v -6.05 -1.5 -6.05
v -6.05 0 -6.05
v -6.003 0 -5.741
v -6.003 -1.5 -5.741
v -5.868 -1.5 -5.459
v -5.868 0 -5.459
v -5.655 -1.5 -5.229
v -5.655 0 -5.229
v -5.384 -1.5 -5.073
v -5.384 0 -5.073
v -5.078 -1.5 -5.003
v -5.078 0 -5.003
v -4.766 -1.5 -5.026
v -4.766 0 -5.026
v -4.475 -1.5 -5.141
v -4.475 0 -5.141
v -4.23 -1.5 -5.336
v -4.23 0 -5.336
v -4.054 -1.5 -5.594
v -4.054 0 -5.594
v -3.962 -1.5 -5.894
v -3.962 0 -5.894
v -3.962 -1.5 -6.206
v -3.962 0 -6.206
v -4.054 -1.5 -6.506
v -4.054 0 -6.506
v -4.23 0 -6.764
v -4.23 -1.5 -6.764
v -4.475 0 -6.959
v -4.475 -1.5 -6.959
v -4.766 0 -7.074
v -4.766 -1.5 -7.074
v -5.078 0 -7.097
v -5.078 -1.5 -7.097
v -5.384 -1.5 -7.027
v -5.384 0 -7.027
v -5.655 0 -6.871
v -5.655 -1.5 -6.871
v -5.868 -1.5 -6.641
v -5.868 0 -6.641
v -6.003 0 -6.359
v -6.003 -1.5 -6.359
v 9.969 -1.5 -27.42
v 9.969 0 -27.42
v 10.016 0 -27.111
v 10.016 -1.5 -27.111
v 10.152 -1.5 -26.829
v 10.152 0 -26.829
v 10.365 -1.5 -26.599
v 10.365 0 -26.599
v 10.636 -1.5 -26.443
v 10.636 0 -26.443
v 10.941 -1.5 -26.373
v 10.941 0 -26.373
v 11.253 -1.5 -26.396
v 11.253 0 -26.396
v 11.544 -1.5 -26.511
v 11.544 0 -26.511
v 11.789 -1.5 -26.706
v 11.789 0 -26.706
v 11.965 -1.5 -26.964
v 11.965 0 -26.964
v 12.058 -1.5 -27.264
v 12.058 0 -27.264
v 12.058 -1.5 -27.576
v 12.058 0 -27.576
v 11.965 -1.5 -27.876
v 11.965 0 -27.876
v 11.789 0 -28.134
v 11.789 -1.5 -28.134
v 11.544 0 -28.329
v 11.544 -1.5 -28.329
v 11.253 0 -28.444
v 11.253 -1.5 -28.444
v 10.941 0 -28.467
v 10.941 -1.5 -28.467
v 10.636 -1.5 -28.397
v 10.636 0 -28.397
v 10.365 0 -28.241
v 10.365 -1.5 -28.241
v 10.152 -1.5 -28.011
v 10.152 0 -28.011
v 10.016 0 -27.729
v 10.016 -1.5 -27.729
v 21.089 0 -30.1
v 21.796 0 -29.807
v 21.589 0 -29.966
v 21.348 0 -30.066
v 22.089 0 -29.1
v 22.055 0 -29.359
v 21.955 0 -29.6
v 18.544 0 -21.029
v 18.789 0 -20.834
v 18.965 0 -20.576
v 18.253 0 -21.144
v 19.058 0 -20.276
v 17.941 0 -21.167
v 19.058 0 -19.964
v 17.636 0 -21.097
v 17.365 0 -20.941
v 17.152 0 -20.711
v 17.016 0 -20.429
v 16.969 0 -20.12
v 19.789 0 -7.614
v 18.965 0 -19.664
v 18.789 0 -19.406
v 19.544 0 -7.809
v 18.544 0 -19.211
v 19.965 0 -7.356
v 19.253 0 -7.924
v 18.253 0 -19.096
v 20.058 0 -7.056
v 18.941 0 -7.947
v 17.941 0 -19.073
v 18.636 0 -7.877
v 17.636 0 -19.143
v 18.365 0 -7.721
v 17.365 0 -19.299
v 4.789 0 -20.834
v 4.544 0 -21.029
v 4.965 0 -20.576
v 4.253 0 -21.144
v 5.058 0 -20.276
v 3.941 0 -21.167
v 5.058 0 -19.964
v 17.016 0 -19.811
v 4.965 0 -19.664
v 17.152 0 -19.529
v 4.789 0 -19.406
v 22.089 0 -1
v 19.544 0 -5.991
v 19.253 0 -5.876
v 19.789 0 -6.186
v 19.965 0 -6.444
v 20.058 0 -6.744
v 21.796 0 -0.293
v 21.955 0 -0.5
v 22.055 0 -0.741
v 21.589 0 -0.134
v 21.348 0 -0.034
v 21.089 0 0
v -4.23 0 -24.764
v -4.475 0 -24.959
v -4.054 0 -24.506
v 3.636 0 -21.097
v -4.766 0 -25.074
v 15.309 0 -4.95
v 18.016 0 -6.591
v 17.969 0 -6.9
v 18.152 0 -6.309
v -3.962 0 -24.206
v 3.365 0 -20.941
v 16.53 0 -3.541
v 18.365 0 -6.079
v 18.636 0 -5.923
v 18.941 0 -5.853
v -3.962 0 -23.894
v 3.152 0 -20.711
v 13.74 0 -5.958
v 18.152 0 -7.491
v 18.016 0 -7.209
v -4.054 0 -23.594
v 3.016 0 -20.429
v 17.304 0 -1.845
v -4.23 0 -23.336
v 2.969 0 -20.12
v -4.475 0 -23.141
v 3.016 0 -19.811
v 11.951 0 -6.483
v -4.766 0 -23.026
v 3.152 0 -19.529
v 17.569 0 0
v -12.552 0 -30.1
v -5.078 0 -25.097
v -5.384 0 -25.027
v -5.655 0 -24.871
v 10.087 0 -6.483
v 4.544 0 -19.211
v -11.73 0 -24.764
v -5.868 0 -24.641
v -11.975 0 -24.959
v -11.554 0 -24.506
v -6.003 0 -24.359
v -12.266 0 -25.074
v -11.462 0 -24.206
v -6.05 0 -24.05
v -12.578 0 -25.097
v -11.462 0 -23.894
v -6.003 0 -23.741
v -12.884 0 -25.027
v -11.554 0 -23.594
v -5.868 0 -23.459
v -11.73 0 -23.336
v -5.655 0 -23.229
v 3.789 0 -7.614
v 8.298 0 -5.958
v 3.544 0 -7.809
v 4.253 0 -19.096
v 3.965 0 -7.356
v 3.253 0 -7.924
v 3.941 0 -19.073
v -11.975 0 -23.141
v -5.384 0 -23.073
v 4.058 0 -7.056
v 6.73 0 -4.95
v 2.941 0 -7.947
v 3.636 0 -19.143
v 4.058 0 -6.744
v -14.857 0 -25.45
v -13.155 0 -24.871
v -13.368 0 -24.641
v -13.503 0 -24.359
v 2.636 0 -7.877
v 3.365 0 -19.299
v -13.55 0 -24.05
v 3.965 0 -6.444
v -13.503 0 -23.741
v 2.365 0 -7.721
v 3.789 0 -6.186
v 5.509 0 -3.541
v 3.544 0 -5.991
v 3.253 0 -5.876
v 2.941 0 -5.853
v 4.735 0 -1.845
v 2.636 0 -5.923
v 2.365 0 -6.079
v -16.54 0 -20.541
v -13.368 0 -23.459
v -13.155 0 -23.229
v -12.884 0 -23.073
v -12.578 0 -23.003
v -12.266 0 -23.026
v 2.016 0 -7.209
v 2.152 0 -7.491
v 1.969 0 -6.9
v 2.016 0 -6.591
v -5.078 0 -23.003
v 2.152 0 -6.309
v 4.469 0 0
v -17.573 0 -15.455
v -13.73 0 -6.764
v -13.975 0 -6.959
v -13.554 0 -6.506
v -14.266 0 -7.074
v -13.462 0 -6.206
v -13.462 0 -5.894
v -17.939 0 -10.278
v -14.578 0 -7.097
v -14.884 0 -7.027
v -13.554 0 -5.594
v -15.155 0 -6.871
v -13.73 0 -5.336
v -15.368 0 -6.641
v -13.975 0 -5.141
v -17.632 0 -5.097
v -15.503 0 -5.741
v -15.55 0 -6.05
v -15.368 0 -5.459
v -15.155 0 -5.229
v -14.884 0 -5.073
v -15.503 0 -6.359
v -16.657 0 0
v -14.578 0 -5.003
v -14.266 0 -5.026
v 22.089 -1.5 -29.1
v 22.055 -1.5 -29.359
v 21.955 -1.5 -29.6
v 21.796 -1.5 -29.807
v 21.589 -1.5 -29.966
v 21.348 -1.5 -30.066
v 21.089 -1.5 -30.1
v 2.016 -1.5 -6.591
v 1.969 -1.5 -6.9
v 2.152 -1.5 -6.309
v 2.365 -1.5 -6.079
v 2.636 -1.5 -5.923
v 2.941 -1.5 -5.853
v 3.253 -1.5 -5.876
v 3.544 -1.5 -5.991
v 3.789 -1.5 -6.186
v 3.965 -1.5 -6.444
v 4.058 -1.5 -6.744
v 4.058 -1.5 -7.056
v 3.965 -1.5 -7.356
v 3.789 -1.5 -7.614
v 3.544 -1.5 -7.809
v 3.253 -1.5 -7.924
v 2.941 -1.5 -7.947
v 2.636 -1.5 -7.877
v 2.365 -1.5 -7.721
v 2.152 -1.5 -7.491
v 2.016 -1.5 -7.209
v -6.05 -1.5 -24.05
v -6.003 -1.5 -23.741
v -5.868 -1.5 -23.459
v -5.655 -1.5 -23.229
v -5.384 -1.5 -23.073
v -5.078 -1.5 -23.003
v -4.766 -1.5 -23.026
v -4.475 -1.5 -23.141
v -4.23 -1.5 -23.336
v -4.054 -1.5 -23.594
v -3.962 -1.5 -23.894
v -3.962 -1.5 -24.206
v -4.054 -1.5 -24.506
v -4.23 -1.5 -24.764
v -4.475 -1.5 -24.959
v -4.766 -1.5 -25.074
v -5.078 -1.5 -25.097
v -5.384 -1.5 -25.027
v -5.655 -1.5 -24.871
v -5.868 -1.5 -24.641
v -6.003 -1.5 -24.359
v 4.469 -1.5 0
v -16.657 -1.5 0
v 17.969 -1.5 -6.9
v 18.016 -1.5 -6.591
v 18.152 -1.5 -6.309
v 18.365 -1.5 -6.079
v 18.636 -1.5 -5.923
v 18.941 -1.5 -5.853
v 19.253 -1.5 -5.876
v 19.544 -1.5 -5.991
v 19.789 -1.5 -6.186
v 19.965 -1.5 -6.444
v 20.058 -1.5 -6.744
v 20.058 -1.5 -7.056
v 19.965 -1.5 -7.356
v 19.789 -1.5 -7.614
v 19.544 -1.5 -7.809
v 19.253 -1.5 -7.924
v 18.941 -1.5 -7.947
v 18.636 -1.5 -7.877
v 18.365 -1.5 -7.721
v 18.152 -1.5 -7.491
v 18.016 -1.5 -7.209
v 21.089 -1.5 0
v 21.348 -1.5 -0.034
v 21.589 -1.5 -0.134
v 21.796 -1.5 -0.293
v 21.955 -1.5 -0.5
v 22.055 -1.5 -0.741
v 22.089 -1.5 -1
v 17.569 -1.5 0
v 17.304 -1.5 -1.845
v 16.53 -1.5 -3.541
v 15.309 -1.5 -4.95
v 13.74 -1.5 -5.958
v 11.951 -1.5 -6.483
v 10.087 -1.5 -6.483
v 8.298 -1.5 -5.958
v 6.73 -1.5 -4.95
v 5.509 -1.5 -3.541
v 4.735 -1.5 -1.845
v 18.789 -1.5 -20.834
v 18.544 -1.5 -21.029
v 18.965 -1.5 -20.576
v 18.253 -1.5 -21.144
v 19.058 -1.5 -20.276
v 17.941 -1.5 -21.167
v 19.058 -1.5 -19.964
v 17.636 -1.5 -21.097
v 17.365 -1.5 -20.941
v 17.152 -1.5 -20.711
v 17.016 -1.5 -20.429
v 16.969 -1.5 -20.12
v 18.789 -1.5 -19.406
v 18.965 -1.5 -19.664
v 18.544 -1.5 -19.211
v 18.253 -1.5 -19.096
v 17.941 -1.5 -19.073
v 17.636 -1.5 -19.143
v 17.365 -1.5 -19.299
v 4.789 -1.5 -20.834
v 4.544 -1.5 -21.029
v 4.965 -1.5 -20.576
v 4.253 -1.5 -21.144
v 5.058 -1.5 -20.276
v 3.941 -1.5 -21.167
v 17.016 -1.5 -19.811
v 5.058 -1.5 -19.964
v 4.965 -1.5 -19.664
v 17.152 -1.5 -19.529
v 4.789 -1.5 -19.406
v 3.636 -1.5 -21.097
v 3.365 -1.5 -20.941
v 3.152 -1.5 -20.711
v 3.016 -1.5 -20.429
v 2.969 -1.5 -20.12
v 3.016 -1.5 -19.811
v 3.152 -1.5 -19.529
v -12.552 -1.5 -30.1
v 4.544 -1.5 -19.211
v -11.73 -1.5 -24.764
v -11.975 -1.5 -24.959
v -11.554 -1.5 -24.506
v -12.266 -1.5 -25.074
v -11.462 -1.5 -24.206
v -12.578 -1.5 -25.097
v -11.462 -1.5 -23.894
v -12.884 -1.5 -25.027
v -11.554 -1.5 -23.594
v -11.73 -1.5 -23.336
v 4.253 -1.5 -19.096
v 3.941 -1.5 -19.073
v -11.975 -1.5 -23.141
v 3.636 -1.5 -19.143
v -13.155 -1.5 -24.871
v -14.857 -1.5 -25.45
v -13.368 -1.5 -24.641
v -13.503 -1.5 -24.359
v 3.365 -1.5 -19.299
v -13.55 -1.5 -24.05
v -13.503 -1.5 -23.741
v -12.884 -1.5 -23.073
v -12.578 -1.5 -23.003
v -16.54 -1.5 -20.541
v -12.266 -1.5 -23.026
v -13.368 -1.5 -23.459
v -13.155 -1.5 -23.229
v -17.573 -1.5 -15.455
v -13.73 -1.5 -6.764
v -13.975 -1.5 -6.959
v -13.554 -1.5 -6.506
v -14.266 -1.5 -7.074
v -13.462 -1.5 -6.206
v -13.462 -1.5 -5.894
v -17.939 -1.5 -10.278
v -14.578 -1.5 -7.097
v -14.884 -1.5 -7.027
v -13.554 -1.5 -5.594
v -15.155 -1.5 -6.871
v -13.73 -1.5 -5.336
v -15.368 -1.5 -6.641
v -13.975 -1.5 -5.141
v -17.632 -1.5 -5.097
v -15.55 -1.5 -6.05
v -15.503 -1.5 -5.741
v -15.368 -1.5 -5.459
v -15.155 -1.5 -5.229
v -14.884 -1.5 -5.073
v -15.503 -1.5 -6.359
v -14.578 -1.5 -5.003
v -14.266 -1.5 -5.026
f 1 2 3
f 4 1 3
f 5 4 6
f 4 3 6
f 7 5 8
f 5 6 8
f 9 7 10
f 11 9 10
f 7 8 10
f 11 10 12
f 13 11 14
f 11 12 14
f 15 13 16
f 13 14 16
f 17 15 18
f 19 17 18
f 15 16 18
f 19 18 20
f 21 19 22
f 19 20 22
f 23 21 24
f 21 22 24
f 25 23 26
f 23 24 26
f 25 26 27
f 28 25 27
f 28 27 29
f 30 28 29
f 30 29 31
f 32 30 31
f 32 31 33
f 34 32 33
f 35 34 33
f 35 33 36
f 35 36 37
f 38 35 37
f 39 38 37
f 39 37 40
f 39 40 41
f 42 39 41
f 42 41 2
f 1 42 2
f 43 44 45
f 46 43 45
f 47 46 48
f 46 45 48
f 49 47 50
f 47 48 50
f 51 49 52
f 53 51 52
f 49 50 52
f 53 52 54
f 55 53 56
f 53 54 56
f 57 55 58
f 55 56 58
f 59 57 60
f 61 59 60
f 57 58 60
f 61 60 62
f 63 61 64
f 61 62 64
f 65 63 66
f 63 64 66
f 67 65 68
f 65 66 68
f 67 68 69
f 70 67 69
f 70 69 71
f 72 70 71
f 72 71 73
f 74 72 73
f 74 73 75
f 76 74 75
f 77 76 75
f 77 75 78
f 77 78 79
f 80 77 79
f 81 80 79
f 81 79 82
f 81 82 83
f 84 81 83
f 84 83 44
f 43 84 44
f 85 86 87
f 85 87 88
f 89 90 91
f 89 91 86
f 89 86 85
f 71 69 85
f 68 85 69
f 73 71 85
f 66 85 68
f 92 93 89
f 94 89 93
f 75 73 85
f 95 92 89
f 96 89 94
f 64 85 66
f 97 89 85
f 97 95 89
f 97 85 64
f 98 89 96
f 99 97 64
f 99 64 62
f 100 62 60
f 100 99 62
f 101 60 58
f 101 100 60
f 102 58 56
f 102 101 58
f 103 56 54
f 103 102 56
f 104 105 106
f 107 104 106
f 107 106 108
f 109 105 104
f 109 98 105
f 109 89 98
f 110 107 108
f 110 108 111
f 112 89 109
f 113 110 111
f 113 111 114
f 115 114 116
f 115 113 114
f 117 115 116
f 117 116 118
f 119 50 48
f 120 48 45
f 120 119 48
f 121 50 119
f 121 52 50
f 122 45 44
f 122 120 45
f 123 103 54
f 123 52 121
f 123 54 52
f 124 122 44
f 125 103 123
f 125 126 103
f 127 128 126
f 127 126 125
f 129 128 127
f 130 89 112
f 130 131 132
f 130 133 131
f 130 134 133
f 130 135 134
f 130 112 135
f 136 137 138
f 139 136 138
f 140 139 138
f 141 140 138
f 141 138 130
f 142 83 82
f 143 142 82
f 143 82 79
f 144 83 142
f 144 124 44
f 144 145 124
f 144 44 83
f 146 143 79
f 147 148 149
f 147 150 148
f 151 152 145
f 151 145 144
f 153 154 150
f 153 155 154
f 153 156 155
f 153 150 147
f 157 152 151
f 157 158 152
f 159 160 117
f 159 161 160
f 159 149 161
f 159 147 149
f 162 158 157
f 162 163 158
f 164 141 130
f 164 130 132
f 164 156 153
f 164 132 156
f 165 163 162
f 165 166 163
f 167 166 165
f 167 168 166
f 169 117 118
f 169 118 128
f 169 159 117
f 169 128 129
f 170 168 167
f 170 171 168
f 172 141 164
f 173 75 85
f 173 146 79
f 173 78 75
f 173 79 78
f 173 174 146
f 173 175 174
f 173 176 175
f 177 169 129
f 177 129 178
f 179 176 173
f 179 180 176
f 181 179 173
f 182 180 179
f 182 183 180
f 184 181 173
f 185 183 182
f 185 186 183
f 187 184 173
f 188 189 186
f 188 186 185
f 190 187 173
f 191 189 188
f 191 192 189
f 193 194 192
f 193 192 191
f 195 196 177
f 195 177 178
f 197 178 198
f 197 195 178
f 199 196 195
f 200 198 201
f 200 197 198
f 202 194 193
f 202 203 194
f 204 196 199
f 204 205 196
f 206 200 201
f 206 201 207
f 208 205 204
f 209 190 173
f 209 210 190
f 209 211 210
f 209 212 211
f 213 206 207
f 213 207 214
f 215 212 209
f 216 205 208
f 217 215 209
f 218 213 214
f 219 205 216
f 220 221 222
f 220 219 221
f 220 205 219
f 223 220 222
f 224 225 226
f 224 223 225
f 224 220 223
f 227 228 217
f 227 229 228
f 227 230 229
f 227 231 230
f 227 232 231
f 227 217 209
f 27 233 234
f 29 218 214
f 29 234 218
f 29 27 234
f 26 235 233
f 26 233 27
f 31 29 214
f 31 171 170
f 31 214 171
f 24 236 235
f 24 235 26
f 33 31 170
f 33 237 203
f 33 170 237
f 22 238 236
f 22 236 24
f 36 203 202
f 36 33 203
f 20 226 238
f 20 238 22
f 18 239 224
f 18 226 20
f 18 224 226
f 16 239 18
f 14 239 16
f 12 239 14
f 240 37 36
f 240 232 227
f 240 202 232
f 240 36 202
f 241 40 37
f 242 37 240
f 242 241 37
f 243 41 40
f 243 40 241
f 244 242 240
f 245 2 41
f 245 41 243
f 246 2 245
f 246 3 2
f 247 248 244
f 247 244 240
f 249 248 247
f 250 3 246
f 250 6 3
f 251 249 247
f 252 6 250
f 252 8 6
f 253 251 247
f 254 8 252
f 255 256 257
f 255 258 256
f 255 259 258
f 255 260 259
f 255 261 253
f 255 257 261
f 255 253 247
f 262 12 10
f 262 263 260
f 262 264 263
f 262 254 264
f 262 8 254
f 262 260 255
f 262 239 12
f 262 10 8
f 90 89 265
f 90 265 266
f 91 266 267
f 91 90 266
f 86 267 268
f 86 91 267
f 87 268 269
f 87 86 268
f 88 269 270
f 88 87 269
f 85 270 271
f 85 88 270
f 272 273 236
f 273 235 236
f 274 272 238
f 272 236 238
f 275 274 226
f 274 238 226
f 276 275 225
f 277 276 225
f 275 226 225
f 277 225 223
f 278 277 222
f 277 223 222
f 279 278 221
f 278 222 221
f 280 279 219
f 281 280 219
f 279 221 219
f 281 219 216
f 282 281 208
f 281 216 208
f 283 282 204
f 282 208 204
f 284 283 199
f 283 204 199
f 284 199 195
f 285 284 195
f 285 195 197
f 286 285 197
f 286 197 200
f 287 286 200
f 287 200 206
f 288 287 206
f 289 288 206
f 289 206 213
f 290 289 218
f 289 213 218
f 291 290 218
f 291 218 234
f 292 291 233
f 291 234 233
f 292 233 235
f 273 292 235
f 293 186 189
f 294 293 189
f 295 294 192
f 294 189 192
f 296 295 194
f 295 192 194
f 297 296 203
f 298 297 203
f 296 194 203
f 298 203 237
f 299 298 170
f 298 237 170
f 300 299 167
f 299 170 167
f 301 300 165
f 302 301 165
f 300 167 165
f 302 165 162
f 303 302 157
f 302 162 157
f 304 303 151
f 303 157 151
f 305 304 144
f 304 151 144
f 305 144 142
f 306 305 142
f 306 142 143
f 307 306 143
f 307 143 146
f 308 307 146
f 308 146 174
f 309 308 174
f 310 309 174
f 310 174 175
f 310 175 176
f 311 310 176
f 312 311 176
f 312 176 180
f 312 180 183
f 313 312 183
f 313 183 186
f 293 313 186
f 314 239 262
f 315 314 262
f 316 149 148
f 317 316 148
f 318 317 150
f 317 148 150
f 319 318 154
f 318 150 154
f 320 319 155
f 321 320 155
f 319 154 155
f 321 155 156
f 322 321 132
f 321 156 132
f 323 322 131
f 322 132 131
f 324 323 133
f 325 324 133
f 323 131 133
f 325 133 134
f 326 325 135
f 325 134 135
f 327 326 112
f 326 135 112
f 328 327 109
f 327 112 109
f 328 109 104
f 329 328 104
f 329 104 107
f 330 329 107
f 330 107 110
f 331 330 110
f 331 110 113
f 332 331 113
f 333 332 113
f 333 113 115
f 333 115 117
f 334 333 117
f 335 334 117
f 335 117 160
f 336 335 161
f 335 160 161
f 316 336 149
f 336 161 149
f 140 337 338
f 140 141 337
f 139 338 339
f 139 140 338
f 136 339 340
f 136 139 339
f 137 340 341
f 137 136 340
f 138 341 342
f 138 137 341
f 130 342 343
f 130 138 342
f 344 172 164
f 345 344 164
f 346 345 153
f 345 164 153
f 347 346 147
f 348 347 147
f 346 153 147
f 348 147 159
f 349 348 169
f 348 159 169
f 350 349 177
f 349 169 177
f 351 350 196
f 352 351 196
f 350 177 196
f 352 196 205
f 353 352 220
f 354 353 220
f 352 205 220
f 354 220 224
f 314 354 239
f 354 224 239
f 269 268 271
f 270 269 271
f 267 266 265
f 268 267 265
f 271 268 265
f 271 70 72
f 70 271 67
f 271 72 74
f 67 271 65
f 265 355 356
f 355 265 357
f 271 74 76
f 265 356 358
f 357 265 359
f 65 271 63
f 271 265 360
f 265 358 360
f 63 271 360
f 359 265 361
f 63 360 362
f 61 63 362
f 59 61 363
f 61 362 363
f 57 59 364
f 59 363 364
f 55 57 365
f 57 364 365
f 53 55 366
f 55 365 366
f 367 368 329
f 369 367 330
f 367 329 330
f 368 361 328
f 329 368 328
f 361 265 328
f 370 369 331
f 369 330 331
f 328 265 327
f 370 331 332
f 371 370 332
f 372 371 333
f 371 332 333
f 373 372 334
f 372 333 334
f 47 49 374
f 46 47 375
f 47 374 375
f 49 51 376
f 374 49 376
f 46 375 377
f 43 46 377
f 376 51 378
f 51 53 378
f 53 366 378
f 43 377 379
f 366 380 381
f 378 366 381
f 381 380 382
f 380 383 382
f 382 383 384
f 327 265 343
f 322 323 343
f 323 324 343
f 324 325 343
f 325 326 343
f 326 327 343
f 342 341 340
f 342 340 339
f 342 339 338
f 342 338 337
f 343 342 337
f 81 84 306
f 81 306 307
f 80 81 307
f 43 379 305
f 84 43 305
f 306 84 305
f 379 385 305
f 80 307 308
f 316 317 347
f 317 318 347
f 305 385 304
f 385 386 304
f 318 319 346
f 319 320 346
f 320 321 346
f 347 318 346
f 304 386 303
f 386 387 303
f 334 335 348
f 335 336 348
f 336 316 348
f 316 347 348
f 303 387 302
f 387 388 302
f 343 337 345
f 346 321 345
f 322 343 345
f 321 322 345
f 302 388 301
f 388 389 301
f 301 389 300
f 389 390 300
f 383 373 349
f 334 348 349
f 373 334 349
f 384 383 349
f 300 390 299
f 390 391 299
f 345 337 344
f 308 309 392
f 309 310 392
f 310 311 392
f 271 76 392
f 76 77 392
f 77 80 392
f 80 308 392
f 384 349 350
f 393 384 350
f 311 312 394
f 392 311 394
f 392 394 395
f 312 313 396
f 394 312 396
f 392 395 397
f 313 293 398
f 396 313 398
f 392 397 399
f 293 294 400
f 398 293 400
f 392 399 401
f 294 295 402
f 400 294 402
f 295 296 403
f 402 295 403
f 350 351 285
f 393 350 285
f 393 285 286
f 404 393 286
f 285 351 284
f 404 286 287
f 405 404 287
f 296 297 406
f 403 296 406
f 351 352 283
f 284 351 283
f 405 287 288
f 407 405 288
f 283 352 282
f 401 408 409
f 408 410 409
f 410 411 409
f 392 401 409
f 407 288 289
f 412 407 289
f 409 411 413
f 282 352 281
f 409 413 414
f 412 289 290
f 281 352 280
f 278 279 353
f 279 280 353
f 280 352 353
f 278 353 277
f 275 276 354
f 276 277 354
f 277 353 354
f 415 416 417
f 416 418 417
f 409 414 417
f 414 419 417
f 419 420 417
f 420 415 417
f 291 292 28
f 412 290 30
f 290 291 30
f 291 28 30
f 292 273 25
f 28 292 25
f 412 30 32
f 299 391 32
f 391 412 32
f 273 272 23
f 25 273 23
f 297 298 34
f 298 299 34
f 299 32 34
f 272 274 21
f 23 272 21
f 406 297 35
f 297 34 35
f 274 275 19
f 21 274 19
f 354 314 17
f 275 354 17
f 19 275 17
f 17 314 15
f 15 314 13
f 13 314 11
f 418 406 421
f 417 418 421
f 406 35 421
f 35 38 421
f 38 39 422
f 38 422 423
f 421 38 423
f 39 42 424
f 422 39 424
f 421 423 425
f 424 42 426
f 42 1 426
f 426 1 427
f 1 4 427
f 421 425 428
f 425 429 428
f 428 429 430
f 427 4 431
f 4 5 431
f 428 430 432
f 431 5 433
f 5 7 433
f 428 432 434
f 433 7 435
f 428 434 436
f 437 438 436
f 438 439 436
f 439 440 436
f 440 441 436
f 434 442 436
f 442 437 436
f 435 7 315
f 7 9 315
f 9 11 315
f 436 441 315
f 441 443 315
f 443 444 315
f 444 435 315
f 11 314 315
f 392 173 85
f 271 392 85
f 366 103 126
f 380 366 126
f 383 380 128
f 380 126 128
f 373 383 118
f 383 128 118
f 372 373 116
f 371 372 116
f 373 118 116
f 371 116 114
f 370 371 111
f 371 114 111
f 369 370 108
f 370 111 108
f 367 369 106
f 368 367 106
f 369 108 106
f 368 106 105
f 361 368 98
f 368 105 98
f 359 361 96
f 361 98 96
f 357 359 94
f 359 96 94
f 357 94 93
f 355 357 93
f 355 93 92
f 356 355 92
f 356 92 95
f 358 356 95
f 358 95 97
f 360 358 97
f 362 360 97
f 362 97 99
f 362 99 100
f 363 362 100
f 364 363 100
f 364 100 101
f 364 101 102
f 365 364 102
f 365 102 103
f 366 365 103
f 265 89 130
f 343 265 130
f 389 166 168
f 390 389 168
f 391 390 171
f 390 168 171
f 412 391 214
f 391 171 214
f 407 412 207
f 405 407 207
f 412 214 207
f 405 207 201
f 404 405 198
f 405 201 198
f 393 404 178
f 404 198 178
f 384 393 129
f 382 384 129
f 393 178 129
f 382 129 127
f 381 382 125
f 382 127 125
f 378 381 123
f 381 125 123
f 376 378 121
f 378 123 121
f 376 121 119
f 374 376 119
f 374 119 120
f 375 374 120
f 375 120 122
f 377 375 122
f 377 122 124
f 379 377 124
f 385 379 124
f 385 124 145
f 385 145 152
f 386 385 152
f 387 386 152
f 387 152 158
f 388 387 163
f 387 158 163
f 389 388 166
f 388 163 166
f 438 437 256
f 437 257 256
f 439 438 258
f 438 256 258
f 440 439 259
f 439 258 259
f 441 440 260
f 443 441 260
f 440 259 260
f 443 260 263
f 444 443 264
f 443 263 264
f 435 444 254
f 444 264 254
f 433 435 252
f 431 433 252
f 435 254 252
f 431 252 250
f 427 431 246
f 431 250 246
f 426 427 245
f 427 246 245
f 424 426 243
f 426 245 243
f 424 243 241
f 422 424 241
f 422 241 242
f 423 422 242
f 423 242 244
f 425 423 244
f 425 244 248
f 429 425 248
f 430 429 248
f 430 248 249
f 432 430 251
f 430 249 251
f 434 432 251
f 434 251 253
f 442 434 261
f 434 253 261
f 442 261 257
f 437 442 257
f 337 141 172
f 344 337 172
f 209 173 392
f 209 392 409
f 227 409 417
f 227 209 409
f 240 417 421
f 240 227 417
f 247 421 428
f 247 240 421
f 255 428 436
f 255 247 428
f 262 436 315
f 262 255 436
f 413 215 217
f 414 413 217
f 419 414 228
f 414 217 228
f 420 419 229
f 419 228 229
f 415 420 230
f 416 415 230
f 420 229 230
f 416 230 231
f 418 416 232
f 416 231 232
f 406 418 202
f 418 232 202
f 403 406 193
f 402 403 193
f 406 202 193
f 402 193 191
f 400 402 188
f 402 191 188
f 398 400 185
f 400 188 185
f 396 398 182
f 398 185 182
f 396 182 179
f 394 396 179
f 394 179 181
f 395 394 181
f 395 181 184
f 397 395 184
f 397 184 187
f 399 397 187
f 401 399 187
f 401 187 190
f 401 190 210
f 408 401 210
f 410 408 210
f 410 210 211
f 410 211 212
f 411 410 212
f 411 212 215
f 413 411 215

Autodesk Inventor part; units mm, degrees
ref_plane "YZ Plane" through (0, 0, 0) normal (1, 0, 0) x (0, 1, 0)
ref_plane "XZ Plane" through (0, 0, 0) normal (0, 1, 0) x (-1, 0, 0)
ref_plane "XY Plane" through (0, 0, 0) normal (0, 0, 1) x (1, 0, 0)
sketch "Sketch1" plane through (0, 0, 0) normal (0, 1, 0) x (-1, 0, 0)
  line L0 (-0.4496, -30.1) -> (-0.4496, 0)
  circle A0 centre (14.5, -6.05) radius 1.05
  circle A1 centre (12.5, -24.05) radius 1.05
  circle A2 centre (5, -24.05) radius 1.05
  circle A3 centre (5, -6.05) radius 1.05
  circle A4 centre (-19.0193, -6.9) radius 1.05
  circle A5 centre (-18.0193, -20.12) radius 1.05
  circle A6 centre (-11.0193, -27.42) radius 1.05
  circle A7 centre (-4.0193, -20.12) radius 1.05
  circle A8 centre (-3.0193, -6.9) radius 1.05
  arc A9 (-21.0893, 0) -> (-22.0893, -1) centre (-21.0893, -1) ccw
  line L1 (-22.0893, -29.1) -> (-22.0893, -1)
  arc A10 (-22.0893, -29.1) -> (-21.0893, -30.1) centre (-21.0893, -29.1) ccw
  arc A11 (12.5521, -30.1) -> (16.6569, 0) centre (-22.06, -10.05) ccw
  line L2 (-4.4693, 0) -> (16.6569, 0)
  line L3 (12.5521, -30.1) -> (-21.0893, -30.1)
  arc A12 (-17.5693, 0) -> (-4.4693, 0) centre (-11.0193, 0) ccw
  line L4 (-21.0893, 0) -> (-17.5693, 0)
  line L5 (-0.8993, -30.1) -> (-0.8993, 0)
  line L6 (0, 0) -> (0, -30.1)
extrude "Extrusion1" add sketch "Sketch1" against normal blind 1.5
properties part number "axis_2_bottom_L_frame(top)" material "Aluminum 6061-AHC"
